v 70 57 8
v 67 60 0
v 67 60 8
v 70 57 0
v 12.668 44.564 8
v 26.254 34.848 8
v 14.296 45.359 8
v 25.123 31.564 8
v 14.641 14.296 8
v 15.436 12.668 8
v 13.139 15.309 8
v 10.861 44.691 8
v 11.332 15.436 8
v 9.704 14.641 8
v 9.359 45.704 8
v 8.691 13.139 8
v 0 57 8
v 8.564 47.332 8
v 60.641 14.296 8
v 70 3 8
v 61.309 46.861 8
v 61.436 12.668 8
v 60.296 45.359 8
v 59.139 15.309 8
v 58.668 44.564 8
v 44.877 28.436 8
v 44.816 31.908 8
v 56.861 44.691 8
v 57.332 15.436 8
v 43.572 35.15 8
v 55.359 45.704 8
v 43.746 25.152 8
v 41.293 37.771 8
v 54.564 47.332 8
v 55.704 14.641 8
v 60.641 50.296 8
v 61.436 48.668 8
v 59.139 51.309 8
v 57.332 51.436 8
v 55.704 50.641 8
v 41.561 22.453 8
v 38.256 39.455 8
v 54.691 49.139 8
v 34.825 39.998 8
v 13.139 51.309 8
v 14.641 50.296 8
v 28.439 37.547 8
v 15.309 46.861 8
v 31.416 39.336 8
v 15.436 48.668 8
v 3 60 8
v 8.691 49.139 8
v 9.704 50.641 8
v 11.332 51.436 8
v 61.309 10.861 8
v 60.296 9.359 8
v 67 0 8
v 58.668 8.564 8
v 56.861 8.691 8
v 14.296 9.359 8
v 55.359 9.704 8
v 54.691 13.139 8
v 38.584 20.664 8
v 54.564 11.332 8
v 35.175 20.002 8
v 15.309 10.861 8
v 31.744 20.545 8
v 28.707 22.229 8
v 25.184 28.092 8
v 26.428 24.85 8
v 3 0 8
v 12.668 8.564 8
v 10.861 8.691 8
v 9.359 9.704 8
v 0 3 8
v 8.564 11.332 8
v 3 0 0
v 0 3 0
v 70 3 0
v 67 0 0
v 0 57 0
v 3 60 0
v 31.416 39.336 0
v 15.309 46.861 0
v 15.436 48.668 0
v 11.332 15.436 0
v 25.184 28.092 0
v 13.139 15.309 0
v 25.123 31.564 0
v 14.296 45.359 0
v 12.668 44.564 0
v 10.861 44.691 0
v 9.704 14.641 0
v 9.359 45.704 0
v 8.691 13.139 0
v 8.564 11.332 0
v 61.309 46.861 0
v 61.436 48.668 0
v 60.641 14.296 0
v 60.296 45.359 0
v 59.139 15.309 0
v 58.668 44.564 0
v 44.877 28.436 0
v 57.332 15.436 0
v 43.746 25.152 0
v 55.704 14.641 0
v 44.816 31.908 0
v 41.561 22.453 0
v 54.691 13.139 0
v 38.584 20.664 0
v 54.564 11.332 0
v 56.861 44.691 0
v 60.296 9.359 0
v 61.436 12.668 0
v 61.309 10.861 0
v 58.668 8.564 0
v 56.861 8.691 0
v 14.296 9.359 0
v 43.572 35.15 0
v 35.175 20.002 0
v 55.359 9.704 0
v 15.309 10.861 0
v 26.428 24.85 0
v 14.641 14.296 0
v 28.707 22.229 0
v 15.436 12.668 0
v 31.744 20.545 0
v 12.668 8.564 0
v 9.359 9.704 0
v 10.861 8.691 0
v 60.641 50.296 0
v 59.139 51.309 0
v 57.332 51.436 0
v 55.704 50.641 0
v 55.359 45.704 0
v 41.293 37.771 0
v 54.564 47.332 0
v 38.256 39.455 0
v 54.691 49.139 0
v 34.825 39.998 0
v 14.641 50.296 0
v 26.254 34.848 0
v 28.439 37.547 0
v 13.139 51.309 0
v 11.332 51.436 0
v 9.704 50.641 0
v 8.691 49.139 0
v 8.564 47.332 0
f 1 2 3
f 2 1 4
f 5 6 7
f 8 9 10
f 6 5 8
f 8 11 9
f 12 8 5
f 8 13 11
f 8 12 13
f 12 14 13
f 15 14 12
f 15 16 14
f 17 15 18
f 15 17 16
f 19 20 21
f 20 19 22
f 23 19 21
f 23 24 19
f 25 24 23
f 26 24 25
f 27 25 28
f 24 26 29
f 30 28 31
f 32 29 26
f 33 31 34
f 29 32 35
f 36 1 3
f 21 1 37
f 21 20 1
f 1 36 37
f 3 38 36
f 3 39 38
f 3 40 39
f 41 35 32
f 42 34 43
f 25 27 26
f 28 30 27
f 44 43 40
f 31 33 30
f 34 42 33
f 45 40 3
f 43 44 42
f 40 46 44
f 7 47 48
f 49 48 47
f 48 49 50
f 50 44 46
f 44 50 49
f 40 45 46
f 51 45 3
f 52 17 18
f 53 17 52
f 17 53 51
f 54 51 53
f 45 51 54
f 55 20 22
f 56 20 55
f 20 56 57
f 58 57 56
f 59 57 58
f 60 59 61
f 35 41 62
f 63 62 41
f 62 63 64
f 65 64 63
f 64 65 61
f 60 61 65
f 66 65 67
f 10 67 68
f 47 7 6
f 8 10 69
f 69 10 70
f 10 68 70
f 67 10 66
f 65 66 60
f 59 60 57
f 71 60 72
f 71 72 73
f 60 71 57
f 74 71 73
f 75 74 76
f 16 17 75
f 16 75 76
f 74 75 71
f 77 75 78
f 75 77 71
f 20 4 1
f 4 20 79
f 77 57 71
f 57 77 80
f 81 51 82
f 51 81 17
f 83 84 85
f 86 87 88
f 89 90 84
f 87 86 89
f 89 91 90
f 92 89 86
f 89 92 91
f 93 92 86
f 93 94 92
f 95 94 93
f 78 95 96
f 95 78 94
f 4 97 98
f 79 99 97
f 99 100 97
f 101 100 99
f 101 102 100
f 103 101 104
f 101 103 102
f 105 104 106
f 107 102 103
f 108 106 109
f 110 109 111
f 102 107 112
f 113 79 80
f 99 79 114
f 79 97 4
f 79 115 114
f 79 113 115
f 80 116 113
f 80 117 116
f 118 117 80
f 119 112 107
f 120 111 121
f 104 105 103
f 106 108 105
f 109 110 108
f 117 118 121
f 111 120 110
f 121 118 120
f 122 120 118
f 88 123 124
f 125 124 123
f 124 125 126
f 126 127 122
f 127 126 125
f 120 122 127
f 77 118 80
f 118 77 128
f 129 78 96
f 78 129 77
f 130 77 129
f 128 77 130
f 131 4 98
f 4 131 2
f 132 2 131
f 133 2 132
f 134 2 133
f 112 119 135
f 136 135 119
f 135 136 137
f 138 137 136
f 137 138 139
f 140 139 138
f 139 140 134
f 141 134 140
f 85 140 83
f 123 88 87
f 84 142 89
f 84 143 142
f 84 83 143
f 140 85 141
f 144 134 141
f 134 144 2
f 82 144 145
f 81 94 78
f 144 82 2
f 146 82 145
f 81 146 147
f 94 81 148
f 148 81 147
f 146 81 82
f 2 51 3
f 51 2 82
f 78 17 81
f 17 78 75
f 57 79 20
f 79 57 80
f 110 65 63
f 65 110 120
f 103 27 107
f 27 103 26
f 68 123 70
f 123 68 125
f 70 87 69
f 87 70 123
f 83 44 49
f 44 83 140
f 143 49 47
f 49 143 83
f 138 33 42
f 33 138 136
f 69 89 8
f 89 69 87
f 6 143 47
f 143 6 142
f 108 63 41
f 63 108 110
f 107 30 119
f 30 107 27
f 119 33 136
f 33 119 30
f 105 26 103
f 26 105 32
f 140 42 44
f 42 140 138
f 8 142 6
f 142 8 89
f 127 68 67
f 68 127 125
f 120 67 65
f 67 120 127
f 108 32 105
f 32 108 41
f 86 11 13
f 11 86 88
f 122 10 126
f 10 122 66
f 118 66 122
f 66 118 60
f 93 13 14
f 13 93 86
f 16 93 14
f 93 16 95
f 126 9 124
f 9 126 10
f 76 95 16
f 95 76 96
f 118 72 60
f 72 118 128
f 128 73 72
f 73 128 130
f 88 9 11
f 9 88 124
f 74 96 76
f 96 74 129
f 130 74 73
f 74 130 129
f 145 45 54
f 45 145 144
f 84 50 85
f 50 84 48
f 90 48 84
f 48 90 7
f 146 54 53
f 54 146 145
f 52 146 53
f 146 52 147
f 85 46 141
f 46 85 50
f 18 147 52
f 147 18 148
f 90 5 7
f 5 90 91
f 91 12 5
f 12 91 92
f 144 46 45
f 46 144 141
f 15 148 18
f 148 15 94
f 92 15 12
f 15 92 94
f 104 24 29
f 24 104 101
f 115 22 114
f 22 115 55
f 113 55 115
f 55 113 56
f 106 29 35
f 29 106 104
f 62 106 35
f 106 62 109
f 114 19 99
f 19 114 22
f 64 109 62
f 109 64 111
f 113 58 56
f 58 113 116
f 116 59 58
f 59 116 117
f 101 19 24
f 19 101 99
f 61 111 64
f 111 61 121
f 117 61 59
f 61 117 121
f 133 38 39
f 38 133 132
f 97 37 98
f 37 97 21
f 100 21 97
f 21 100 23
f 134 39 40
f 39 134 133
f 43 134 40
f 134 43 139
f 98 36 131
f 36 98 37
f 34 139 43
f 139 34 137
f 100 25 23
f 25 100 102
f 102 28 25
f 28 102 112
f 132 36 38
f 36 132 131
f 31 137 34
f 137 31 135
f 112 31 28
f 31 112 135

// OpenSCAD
$fn = 32;

// ----------------------------------------------------------------------
// Spacer plate: rect 70 x 60
// ----------------------------------------------------------------------

// --- parameters (mm) ---
bore_r = 10;              // centre bore radius
bolt_r = 3.5;             // bolt hole radius
plate_t = 8;              // plate thickness, Z (extrusion height)
plate_l = 70;             // plate length, X
plate_w = 60;             // plate width, Y
inset = 12;               // corner hole inset

profile = [[3, 0], [67, 0], [70, 3], [70, 57], [67, 60], [3, 60], [0, 57], [0, 3]];  // primary outline, 8 points, counter clockwise
void_1 = [[44.816, 31.908], [43.572, 35.15], [41.293, 37.771], [38.256, 39.455], [34.825, 39.998], [31.416, 39.336], [28.439, 37.547], [26.254, 34.848], [25.123, 31.564], [25.184, 28.092], [26.428, 24.85], [28.707, 22.229], [31.744, 20.545], [35.175, 20.002], [38.584, 20.664], [41.561, 22.453], [43.746, 25.152], [44.877, 28.436]];  // centre bore, 18 points
void_2 = [[15.436, 12.668], [14.641, 14.296], [13.139, 15.309], [11.332, 15.436], [9.704, 14.641], [8.691, 13.139], [8.564, 11.332], [9.359, 9.704], [10.861, 8.691], [12.668, 8.564], [14.296, 9.359], [15.309, 10.861]];  // corner hole, 12 points
void_3 = [[15.436, 48.668], [14.641, 50.296], [13.139, 51.309], [11.332, 51.436], [9.704, 50.641], [8.691, 49.139], [8.564, 47.332], [9.359, 45.704], [10.861, 44.691], [12.668, 44.564], [14.296, 45.359], [15.309, 46.861]];  // corner hole, 12 points
void_4 = [[61.436, 12.668], [60.641, 14.296], [59.139, 15.309], [57.332, 15.436], [55.704, 14.641], [54.691, 13.139], [54.564, 11.332], [55.359, 9.704], [56.861, 8.691], [58.668, 8.564], [60.296, 9.359], [61.309, 10.861]];  // corner hole, 12 points
void_5 = [[61.436, 48.668], [60.641, 50.296], [59.139, 51.309], [57.332, 51.436], [55.704, 50.641], [54.691, 49.139], [54.564, 47.332], [55.359, 45.704], [56.861, 44.691], [58.668, 44.564], [60.296, 45.359], [61.309, 46.861]];  // corner hole, 12 points

// --- the one profile operation ---
difference() {
  linear_extrude(height = plate_t) polygon(points = profile);
  translate([0, 0, -1])
    linear_extrude(height = plate_t + 2) polygon(points = void_1);
  translate([0, 0, -1])
    linear_extrude(height = plate_t + 2) polygon(points = void_2);
  translate([0, 0, -1])
    linear_extrude(height = plate_t + 2) polygon(points = void_3);
  translate([0, 0, -1])
    linear_extrude(height = plate_t + 2) polygon(points = void_4);
  translate([0, 0, -1])
    linear_extrude(height = plate_t + 2) polygon(points = void_5);
}
